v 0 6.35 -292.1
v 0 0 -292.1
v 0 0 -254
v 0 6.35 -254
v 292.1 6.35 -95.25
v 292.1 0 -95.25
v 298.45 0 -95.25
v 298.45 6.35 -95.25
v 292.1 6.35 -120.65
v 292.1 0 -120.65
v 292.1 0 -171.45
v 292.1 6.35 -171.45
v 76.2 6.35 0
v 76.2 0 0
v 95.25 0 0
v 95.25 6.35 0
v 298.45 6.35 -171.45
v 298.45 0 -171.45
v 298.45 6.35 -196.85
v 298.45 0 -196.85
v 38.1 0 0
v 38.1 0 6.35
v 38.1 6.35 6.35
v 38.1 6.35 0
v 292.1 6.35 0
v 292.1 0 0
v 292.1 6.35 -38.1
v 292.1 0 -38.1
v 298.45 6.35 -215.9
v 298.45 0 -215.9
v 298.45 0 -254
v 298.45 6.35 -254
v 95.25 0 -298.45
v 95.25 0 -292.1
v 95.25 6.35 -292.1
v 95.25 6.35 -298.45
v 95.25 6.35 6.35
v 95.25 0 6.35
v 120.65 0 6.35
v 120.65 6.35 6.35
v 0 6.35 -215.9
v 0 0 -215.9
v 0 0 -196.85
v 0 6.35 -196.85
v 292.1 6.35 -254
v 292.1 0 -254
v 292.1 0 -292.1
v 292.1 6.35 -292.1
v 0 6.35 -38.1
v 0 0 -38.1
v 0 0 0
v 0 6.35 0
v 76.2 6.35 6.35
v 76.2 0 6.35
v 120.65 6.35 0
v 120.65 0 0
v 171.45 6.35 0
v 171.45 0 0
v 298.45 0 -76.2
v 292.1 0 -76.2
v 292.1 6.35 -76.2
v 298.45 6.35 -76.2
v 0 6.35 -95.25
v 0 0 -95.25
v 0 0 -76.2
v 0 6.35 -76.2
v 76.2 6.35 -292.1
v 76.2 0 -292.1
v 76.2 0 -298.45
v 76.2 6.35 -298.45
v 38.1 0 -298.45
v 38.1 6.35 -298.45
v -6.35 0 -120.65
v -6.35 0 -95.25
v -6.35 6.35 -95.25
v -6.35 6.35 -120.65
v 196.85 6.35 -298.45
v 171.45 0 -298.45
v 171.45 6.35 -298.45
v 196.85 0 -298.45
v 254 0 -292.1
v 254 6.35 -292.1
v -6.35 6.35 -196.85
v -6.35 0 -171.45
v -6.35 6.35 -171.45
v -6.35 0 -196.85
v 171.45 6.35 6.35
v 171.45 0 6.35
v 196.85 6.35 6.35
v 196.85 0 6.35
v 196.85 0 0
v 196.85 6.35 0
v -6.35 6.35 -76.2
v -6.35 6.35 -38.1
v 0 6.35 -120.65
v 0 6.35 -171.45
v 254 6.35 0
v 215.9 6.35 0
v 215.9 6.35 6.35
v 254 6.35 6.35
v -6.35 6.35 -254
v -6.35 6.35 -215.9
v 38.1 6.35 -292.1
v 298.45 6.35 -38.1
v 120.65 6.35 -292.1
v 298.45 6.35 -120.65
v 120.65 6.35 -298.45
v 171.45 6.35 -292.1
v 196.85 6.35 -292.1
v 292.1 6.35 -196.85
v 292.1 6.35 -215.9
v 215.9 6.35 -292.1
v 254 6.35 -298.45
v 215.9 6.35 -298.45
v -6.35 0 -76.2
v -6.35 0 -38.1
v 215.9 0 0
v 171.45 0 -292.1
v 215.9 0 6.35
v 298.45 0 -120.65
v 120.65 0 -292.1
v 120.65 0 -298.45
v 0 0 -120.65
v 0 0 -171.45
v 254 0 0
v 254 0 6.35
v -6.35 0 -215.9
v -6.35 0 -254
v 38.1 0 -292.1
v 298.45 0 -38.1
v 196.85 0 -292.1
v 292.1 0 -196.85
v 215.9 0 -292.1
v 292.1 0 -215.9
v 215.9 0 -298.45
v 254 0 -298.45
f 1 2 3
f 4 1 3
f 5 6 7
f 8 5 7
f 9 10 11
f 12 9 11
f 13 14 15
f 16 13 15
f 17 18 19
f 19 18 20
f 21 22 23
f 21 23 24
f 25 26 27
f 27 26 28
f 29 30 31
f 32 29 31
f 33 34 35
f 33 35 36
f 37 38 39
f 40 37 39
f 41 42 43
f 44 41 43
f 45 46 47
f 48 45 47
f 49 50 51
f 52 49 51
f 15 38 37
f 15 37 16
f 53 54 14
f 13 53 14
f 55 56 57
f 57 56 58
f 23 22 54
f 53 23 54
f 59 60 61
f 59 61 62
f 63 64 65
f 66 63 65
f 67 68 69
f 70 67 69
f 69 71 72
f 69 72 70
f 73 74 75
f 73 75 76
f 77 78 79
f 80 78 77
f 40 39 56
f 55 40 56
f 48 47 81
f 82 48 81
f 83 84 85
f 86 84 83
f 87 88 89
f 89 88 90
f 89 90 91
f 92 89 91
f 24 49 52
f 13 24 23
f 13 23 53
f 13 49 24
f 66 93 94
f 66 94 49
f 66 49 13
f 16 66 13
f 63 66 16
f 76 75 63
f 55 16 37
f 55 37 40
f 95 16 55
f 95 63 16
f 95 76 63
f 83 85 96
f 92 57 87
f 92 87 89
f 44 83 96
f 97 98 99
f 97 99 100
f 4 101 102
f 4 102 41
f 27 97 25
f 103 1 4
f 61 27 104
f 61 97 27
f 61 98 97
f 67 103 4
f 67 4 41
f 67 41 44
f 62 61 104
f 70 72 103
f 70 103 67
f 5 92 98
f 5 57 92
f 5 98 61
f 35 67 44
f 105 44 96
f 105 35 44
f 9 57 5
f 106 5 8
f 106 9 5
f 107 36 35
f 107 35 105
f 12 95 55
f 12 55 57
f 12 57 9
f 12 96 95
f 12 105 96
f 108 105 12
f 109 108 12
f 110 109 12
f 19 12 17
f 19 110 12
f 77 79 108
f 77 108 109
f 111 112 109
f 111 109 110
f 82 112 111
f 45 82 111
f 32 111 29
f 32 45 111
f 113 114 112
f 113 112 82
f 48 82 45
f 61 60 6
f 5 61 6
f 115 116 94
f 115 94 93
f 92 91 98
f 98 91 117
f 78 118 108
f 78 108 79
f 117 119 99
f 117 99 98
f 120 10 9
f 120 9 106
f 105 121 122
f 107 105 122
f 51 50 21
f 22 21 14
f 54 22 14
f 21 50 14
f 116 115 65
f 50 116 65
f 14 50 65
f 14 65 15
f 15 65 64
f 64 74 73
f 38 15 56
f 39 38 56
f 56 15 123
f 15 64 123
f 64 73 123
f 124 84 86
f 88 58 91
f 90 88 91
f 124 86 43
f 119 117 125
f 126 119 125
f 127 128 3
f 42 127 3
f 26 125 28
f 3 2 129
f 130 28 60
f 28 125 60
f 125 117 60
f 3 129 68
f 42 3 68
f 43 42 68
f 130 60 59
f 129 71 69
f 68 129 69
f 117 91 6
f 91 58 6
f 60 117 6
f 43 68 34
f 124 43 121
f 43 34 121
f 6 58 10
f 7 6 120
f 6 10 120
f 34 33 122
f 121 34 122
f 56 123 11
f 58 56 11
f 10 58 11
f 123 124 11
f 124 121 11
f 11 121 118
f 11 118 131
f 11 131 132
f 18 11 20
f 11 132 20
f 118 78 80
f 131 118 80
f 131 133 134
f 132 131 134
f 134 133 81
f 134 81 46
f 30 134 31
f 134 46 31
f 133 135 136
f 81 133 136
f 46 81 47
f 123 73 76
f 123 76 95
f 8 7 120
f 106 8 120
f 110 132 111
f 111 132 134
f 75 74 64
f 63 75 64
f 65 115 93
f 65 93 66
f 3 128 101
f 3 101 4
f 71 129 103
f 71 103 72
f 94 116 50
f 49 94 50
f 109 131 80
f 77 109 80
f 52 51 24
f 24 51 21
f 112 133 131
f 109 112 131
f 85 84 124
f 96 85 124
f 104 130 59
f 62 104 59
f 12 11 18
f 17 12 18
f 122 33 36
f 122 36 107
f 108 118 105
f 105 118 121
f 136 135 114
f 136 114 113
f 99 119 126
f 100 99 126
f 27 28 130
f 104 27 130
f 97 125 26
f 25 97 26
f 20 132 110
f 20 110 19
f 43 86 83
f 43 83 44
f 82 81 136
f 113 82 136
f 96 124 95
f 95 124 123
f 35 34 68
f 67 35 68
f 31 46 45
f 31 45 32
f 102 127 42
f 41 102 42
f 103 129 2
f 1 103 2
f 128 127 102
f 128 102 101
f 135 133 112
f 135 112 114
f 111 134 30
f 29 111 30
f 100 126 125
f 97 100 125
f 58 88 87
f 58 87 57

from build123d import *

# Parameters (mm, degrees)
SKETCH2_W           = 38.1
SKETCH2_H           = 6.35
SKETCH2_W_2         = 25.4
SKETCH2_W_3         = 6.35
SKETCH2_H_2         = 38.1
SKETCH2_H_3         = 25.4
BOSS_EXTRUDE1_DEPTH = 6.35


with BuildPart() as part:
    # Sketch2 → Boss-Extrude1 (new body)
    with BuildSketch(Plane(origin=(0, 0, 0), x_dir=(1, 0, 0), z_dir=(0, 1, 0))):
        with Locations((57.15, -3.175)):
            Rectangle(SKETCH2_W, SKETCH2_H)
        with Locations((107.95, -3.175)):
            Rectangle(SKETCH2_W_2, SKETCH2_H)
        with Locations((184.15, -3.175)):
            Rectangle(SKETCH2_W_2, SKETCH2_H)
        with Locations((234.95, -3.175)):
            Rectangle(SKETCH2_W, SKETCH2_H)
        with Locations((295.275, 57.15)):
            Rectangle(SKETCH2_W_3, SKETCH2_H_2)
        with Locations((295.275, 107.95)):
            Rectangle(SKETCH2_W_3, SKETCH2_H_3)
        with Locations((295.275, 184.15)):
            Rectangle(SKETCH2_W_3, SKETCH2_H_3)
        with Locations((295.275, 234.95)):
            Rectangle(SKETCH2_W_3, SKETCH2_H_2)
        with Locations((234.95, 295.275)):
            Rectangle(SKETCH2_W, SKETCH2_H)
        with Locations((184.15, 295.275)):
            Rectangle(SKETCH2_W_2, SKETCH2_H)
        with Locations((107.95, 295.275)):
            Rectangle(SKETCH2_W_2, SKETCH2_H)
        with Locations((57.15, 295.275)):
            Rectangle(SKETCH2_W, SKETCH2_H)
        with Locations((-3.175, 234.95)):
            Rectangle(SKETCH2_W_3, SKETCH2_H_2)
        with Locations((-3.175, 184.15)):
            Rectangle(SKETCH2_W_3, SKETCH2_H_3)
        with Locations((-3.175, 107.95)):
            Rectangle(SKETCH2_W_3, SKETCH2_H_3)
        with Locations((-3.175, 57.15)):
            Rectangle(SKETCH2_W_3, SKETCH2_H_2)
        Polygon((0, 0), (146.05, 146.05), (0, 146.05), (0, 120.65), (0, 95.25), (0, 76.2), (0, 38.1), align=None)
        Polygon((120.65, 0), (146.05, 0), (146.05, 146.05), (0, 0), (38.1, 0), (76.2, 0), (95.25, 0), align=None)
        Polygon((146.05, 146.05), (146.05, 0), (171.45, 0), (196.85, 0), (215.9, 0), (254, 0), (292.1, 0), (292.1, 38.1), (292.1, 76.2), (292.1, 95.25), (292.1, 120.65), (292.1, 146.05), align=None)
        Polygon((292.1, 292.1), (146.05, 146.05), (292.1, 146.05), (292.1, 171.45), (292.1, 196.85), (292.1, 215.9), (292.1, 254), align=None)
        Polygon((146.05, 292.1), (146.05, 146.05), (292.1, 292.1), (254, 292.1), (215.9, 292.1), (196.85, 292.1), (171.45, 292.1), align=None)
        Polygon((0, 146.05), (146.05, 146.05), (146.05, 292.1), (120.65, 292.1), (95.25, 292.1), (76.2, 292.1), (38.1, 292.1), (0, 292.1), (0, 254), (0, 215.9), (0, 196.85), (0, 171.45), align=None)
    extrude(amount=BOSS_EXTRUDE1_DEPTH)


solid = part.part
